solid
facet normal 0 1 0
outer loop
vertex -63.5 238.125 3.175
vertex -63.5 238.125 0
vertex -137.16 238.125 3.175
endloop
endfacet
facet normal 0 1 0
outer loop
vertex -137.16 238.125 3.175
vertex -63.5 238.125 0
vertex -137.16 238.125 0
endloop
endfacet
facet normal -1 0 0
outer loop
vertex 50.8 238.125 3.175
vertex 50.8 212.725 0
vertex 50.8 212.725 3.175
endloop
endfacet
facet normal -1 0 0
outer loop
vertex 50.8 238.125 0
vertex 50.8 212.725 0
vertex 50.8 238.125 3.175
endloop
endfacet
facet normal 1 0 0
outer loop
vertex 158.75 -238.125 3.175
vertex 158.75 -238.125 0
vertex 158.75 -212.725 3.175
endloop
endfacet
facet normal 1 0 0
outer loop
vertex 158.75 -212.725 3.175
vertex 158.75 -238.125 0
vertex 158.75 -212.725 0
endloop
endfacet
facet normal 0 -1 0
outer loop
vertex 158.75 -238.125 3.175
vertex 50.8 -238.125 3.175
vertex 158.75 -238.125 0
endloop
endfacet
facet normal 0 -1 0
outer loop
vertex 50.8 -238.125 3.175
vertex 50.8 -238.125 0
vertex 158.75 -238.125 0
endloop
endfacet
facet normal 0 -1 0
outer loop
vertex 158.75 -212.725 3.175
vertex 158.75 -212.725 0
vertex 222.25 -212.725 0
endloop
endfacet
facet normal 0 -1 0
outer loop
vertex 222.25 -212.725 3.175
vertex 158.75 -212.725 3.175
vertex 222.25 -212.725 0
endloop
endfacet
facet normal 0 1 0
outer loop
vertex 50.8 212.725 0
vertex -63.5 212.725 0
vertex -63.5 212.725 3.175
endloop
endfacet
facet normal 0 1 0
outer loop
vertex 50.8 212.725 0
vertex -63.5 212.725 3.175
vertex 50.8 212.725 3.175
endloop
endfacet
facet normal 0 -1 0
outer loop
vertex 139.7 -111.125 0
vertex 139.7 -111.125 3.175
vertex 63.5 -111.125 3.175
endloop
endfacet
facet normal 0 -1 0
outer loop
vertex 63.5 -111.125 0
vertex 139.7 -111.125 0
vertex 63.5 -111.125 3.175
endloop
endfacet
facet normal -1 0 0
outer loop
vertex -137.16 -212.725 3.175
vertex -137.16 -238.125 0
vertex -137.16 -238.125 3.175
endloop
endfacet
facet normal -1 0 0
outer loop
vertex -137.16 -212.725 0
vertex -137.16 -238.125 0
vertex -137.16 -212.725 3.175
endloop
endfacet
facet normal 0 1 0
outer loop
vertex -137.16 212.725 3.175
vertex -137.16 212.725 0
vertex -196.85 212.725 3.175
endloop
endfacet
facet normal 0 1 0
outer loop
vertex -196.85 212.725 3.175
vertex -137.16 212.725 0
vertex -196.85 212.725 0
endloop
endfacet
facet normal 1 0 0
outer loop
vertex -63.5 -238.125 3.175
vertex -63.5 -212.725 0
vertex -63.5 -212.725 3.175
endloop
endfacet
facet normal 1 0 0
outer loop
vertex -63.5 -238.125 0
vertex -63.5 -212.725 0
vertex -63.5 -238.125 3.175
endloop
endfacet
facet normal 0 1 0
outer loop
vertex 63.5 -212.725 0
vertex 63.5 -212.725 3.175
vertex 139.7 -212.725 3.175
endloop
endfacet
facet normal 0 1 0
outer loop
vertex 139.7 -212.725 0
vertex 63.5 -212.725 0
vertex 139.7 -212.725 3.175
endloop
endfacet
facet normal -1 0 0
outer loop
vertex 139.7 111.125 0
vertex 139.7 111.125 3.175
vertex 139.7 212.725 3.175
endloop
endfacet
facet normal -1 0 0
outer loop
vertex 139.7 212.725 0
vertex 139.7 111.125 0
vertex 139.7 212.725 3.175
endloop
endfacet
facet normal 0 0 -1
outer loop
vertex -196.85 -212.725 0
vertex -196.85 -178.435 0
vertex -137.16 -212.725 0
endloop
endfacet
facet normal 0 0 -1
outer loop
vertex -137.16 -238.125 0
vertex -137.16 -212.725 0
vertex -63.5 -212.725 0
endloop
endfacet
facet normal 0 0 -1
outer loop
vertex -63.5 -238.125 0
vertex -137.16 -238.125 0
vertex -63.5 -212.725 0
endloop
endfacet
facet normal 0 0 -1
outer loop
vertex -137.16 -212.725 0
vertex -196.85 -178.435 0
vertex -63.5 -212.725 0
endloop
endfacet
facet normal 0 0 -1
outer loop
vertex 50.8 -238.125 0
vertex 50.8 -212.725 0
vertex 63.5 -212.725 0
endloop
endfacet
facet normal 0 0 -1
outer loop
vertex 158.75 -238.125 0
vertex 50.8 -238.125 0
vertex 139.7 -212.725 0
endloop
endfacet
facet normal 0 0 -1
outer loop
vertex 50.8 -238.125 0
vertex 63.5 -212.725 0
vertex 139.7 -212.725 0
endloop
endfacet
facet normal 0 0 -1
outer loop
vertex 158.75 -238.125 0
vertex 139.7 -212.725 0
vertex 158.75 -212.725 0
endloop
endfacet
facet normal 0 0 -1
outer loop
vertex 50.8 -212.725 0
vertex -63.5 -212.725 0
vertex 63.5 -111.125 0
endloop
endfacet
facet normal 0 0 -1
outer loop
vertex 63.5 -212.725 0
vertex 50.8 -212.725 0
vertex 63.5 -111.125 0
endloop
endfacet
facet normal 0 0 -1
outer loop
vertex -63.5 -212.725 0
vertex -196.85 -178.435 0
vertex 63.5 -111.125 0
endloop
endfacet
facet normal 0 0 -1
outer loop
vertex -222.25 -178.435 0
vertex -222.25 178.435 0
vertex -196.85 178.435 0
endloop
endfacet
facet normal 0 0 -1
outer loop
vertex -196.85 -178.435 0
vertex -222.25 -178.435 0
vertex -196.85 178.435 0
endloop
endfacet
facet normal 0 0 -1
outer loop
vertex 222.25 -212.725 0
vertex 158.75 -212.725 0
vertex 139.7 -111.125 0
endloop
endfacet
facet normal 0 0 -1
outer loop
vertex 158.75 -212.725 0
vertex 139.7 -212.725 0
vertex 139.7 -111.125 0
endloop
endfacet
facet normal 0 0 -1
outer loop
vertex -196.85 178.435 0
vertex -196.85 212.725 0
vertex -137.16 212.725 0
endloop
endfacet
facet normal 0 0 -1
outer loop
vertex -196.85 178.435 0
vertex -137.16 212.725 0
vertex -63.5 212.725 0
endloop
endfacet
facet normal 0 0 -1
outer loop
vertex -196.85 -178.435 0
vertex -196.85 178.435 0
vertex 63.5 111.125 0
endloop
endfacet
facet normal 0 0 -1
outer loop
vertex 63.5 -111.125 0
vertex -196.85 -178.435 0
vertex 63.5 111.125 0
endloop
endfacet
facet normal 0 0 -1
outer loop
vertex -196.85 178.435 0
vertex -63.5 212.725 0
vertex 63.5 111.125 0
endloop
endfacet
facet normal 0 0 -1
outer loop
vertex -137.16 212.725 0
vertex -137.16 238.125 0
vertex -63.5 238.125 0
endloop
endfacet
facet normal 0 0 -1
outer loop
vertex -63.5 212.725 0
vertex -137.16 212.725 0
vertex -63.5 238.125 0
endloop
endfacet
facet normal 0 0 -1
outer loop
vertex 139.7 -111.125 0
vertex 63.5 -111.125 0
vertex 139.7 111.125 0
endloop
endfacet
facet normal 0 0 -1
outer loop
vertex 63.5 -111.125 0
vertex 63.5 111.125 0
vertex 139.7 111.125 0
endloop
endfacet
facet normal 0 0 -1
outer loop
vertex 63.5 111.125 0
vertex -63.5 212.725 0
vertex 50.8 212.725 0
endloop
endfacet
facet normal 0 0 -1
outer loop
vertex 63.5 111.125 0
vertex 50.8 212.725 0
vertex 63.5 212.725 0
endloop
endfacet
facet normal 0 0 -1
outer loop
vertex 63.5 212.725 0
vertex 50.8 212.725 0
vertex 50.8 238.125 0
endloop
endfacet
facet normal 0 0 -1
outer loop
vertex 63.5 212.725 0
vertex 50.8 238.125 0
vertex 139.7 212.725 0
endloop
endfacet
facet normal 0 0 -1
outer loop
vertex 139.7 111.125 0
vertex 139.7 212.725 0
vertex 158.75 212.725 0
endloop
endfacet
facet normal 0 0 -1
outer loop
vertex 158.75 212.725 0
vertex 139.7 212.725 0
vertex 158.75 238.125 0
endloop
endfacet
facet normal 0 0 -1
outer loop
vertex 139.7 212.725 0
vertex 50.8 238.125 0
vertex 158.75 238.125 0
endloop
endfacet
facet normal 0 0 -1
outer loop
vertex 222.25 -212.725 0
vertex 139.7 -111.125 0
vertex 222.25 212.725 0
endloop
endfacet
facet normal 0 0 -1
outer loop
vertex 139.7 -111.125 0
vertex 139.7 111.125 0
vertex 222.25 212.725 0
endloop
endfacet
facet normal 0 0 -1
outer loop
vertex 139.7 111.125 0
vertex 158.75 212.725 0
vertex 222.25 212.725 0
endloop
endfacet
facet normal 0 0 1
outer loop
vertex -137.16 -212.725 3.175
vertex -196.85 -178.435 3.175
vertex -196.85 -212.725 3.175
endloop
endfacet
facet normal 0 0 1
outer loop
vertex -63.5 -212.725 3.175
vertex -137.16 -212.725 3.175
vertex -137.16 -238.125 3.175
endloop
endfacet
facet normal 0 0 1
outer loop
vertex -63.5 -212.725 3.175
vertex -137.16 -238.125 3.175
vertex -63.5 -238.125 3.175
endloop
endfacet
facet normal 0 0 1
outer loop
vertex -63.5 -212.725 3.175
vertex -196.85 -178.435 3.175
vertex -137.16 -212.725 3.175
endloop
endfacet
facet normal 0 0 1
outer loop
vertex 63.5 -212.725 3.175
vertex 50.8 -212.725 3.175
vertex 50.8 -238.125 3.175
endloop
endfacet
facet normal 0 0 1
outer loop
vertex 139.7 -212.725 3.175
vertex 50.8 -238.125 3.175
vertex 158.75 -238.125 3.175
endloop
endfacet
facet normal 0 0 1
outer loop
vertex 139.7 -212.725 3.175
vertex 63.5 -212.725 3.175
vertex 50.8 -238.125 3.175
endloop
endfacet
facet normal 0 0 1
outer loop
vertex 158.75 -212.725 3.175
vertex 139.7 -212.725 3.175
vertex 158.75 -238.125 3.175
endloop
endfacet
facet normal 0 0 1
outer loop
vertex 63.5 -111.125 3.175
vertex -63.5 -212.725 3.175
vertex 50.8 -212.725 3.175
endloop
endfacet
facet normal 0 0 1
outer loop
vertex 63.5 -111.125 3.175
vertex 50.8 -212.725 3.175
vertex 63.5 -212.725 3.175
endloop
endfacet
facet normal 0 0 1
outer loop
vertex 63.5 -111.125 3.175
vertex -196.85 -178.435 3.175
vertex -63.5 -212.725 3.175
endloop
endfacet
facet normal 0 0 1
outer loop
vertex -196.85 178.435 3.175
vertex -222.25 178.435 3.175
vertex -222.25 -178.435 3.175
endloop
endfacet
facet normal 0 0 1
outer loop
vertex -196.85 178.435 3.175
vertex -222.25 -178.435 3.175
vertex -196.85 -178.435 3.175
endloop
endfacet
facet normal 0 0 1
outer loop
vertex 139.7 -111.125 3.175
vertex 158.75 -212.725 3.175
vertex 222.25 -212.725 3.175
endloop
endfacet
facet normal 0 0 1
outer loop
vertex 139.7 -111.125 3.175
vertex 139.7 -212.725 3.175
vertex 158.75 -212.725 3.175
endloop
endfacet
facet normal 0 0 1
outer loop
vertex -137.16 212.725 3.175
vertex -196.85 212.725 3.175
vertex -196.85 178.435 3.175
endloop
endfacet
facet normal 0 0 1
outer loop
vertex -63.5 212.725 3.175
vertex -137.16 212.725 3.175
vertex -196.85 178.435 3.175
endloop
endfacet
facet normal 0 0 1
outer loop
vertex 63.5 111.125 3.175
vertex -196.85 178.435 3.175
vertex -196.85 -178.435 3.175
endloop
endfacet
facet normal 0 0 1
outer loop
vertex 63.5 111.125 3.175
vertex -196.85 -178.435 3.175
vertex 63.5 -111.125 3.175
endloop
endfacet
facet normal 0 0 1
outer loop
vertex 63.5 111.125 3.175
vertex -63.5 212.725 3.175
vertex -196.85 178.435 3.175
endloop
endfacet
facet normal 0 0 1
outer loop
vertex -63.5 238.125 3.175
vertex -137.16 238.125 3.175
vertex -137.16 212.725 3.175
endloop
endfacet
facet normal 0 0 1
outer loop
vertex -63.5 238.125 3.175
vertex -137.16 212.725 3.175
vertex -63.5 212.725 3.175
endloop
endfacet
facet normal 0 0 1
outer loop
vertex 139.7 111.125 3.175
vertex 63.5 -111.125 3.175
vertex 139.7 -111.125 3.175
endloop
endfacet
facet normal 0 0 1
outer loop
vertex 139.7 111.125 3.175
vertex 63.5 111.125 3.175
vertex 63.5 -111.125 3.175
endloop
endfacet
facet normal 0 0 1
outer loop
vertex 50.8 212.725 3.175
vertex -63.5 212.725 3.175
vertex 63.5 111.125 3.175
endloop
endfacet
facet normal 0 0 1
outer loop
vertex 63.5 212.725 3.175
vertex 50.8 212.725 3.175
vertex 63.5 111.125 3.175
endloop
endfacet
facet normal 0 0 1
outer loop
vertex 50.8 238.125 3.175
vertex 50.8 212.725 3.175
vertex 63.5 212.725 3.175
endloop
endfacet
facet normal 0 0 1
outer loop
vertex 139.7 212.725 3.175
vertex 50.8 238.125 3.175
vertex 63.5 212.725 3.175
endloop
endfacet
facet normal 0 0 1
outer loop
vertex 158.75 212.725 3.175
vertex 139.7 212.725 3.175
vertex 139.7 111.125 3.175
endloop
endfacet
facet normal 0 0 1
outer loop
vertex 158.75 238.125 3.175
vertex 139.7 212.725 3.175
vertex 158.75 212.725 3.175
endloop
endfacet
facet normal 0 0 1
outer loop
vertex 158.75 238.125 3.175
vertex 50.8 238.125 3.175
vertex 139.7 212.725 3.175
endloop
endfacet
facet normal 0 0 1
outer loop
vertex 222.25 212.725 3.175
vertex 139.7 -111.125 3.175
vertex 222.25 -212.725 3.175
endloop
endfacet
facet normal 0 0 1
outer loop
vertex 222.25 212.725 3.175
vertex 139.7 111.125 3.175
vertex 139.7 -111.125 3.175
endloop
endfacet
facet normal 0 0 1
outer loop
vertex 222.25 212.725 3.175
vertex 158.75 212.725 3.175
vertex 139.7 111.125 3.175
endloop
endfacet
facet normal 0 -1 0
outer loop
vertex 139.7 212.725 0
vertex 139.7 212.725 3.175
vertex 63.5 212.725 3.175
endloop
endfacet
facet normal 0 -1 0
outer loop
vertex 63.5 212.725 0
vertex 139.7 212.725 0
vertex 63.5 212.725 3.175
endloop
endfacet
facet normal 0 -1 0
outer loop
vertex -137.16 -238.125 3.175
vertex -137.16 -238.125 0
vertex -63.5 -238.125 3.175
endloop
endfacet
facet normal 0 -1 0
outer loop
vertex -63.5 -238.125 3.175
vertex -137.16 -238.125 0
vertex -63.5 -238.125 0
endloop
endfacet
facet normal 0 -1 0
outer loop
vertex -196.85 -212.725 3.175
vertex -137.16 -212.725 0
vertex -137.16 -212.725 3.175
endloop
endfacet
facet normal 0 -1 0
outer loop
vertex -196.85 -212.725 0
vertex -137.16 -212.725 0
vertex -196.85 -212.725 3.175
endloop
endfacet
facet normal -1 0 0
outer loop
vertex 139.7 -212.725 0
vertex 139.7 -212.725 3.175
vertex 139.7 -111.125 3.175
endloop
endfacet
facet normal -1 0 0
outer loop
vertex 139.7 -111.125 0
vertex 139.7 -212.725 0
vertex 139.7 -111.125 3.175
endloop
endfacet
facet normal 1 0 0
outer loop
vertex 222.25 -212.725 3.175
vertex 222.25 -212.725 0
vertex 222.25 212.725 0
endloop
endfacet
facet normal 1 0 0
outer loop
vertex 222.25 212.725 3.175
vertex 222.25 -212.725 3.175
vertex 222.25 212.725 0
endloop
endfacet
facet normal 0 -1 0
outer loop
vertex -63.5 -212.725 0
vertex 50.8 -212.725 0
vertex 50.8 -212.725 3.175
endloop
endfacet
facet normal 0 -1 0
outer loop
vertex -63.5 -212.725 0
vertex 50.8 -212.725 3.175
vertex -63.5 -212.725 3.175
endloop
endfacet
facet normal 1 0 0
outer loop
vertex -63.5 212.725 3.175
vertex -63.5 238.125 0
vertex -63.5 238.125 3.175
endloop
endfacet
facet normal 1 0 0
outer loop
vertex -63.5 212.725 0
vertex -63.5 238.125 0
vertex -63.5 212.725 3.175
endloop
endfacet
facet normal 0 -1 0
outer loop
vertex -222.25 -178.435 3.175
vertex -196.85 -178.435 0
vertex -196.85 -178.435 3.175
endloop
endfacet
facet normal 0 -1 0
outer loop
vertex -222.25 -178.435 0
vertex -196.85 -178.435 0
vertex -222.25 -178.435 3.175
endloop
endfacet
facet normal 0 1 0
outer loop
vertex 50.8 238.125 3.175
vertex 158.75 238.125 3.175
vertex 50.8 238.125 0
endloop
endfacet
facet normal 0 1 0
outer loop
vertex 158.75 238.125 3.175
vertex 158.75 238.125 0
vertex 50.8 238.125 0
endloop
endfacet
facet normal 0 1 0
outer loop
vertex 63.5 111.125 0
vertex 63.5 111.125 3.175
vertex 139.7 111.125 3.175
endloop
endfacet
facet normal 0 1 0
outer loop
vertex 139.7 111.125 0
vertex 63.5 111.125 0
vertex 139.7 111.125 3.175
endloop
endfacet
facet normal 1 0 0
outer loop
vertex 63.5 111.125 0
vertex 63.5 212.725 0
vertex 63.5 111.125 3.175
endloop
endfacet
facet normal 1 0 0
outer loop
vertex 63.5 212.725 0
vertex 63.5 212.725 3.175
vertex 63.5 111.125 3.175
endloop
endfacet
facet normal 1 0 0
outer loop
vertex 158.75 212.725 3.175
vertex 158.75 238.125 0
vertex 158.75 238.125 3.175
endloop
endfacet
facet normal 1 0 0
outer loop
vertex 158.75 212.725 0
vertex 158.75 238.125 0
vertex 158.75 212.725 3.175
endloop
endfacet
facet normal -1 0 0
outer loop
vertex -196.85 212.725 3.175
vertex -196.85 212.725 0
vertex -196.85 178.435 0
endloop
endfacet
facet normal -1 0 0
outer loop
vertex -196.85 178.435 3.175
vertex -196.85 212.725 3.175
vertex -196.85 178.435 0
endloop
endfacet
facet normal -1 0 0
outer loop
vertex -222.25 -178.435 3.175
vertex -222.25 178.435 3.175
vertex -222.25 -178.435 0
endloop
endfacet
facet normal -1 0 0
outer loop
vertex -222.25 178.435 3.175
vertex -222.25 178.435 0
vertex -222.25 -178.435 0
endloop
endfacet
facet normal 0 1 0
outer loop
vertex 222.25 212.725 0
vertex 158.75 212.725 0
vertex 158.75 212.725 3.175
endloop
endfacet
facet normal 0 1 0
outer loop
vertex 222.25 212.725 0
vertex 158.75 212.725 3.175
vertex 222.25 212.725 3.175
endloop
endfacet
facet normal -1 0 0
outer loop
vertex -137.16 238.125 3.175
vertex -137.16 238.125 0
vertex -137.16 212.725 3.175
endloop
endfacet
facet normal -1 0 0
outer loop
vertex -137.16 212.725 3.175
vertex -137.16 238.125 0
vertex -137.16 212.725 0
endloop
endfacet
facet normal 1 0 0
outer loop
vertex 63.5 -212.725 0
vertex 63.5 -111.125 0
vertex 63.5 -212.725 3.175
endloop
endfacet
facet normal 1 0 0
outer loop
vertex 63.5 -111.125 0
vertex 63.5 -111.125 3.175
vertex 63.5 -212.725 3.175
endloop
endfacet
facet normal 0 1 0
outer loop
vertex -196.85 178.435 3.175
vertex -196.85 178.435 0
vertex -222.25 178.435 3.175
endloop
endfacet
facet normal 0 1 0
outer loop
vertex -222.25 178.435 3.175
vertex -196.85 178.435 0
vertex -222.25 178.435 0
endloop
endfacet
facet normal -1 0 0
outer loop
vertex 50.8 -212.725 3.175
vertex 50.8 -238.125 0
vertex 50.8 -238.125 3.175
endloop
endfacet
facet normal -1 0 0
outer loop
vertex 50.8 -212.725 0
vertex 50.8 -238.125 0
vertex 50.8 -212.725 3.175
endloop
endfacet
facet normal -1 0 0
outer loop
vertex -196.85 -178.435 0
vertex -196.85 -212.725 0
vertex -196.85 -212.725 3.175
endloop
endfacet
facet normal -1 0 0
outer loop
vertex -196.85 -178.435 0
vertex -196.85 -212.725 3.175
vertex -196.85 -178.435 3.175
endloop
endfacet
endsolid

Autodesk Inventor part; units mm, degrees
ref_plane "YZ Plane" through (0, 0, 0) normal (1, 0, 0) x (0, 1, 0)
ref_plane "XZ Plane" through (0, 0, 0) normal (0, 1, 0) x (-1, 0, 0)
ref_plane "XY Plane" through (0, 0, 0) normal (0, 0, 1) x (1, 0, 0)
sketch "Sketch1" plane through (0, 0, 0) normal (0, 0, 1) x (1, 0, 0)
  line L0 (-222.25, -238.125) -> (222.25, -238.125)
  line L1 (222.25, -238.125) -> (222.25, 238.125)
  line L2 (222.25, 238.125) -> (-222.25, 238.125)
  line L3 (-222.25, 238.125) -> (-222.25, -238.125)
  line L4 (-222.25, -238.125) -> (222.25, 238.125) construction
  line L5 (222.25, -238.125) -> (-222.25, 238.125) construction
  point P0 (0, 0)
  dimension "d0" = 444.5
  dimension "d1" = 476.25
extrude "Extrusion1" add sketch "Sketch1" along normal blind 3.175
sketch "Sketch3" plane through (0, 0, 3.175) normal (0, 0, 1) x (1, 0, 0)
  line L0 (-222.25, -238.125) -> (222.25, -238.125) construction
  line L1 (222.25, -238.125) -> (222.25, -161.925) construction
  line L2 (222.25, -238.125) -> (222.25, 238.125) construction
  line L3 (222.25, -161.925) -> (101.6, -161.925) construction
  line L4 (63.5, -212.725) -> (139.7, -212.725)
  line L5 (139.7, -212.725) -> (139.7, -111.125)
  line L6 (139.7, -111.125) -> (63.5, -111.125)
  line L7 (63.5, -111.125) -> (63.5, -212.725)
  line L8 (63.5, -212.725) -> (139.7, -111.125) construction
  line L9 (139.7, -212.725) -> (63.5, -111.125) construction
  point P0 (0, 0)
  dimension "d10" = 76.2
  dimension "d11" = 120.65
  dimension "d12" = 76.2
  dimension "d13" = 101.6
extrude "Extrusion3" cut sketch "Sketch3" against normal through all
sketch "Sketch4" plane through (0, 0, 3.175) normal (0, 0, 1) x (1, 0, 0)
  line L0 (222.25, -238.125) -> (222.25, 238.125) construction
  line L1 (222.25, 238.125) -> (222.25, 161.925) construction
  line L2 (222.25, 161.925) -> (101.6, 161.925) construction
  line L3 (63.5, 111.125) -> (139.7, 111.125)
  line L4 (139.7, 111.125) -> (139.7, 212.725)
  line L5 (139.7, 212.725) -> (63.5, 212.725)
  line L6 (63.5, 212.725) -> (63.5, 111.125)
  line L7 (63.5, 111.125) -> (139.7, 212.725) construction
  line L8 (139.7, 111.125) -> (63.5, 212.725) construction
  point P0 (0, 0)
  dimension "d16" = 76.2
  dimension "d17" = 120.65
  dimension "d18" = 76.2
  dimension "d19" = 101.6
extrude "Extrusion4" cut sketch "Sketch4" against normal through all
sketch "Sketch5" plane through (0, 0, 0) normal (0, 0, -1) x (-1, 0, 0)
  line L0 (-222.25, -238.125) -> (-222.25, 238.125) projected
  line L1 (-222.25, -238.125) -> (-158.75, -238.125)
  line L2 (-158.75, -238.125) -> (-158.75, -212.725)
  line L3 (-158.75, -212.725) -> (-222.25, -212.725)
  line L4 (-222.25, -212.725) -> (-222.25, -238.125)
  point P0 (0, 0)
  dimension "d22" = 63.5
  dimension "d23" = 25.4
extrude "Extrusion5" cut sketch "Sketch5" against normal through all
sketch "Sketch6" plane through (0, 0, 0) normal (0, 0, -1) x (-1, 0, 0)
  line L0 (-222.25, 238.125) -> (-158.75, 238.125)
  line L1 (-158.75, 238.125) -> (-158.75, 212.725)
  line L2 (-158.75, 212.725) -> (-222.25, 212.725)
  line L3 (-222.25, 212.725) -> (-222.25, 238.125)
  point P0 (0, 0)
  dimension "d26" = 63.5
  dimension "d27" = 25.4
extrude "Extrusion6" cut sketch "Sketch6" against normal through all
sketch "Sketch7" plane through (0, 0, 0) normal (0, 0, -1) x (-1, 0, 0)
  line L0 (-158.75, 238.125) -> (222.25, 238.125) projected
  line L1 (222.25, 238.125) -> (137.16, 238.125)
  line L2 (137.16, 238.125) -> (137.16, 212.725)
  line L3 (137.16, 212.725) -> (196.85, 212.725)
  line L4 (222.25, 217.4302) -> (222.25, 238.125)
  line L5 (222.25, 238.125) -> (187.6675, 238.125)
  line L6 (196.85, 212.725) -> (196.85, 178.435)
  line L7 (196.85, 178.435) -> (222.25, 178.435)
  line L8 (222.25, 178.435) -> (222.25, 238.125)
  point P0 (0, 0)
  dimension "d31" = 25.4
  dimension "d32" = 25.4
  dimension "d36" = 59.69
  dimension "d37" = 85.09
extrude "Extrusion7" cut sketch "Sketch7" against normal through all
sketch "Sketch8" plane through (0, 0, 0) normal (0, 0, -1) x (-1, 0, 0)
  line L0 (222.25, -238.125) -> (-158.75, -238.125) projected
  line L1 (222.25, -238.125) -> (196.85, -238.125)
  line L2 (196.85, -212.725) -> (196.85, -178.435)
  line L3 (196.85, -178.435) -> (222.25, -178.435)
  line L4 (222.25, -178.435) -> (222.25, -238.125)
  line L5 (222.25, -238.125) -> (137.16, -238.125)
  line L6 (137.16, -238.125) -> (137.16, -212.725)
  line L7 (137.16, -212.725) -> (196.85, -212.725)
  line L8 (222.25, -212.725) -> (222.25, -238.125)
  point P0 (0, 0)
  dimension "d38" = 25.4
  dimension "d39" = 59.69
  dimension "d40" = 85.09
  dimension "d41" = 25.4
extrude "Extrusion8" cut sketch "Sketch8" against normal through all
sketch "Sketch9" plane through (0, 0, 0) normal (0, 0, -1) x (-1, 0, 0)
  line L0 (-158.75, 212.725) -> (-158.75, 238.125) construction
  line L1 (-158.75, 225.425) -> (6.35, 225.425) construction
  line L2 (-50.8, 238.125) -> (63.5, 238.125)
  line L3 (63.5, 238.125) -> (63.5, 212.725)
  line L4 (63.5, 212.725) -> (-50.8, 212.725)
  line L5 (-50.8, 212.725) -> (-50.8, 238.125)
  line L6 (-50.8, 238.125) -> (63.5, 212.725) construction
  line L7 (63.5, 238.125) -> (-50.8, 212.725) construction
  line L8 (-158.75, -238.125) -> (-158.75, -212.725) construction
  line L9 (-158.75, -225.425) -> (6.35, -225.425) construction
  line L10 (-50.8, -212.725) -> (63.5, -212.725)
  line L11 (63.5, -212.725) -> (63.5, -238.125)
  line L12 (63.5, -238.125) -> (-50.8, -238.125)
  line L13 (-50.8, -238.125) -> (-50.8, -212.725)
  line L14 (-50.8, -212.725) -> (63.5, -238.125) construction
  line L15 (63.5, -212.725) -> (-50.8, -238.125) construction
  point P0 (0, 0)
  dimension "d44" = 165.1
  dimension "d45" = 114.3
  dimension "d46" = 25.4
  dimension "d47" = 165.1
  dimension "d48" = 114.3
  dimension "d49" = 25.4
extrude "Extrusion9" cut sketch "Sketch9" against normal through all
properties part number "Bellypan"
